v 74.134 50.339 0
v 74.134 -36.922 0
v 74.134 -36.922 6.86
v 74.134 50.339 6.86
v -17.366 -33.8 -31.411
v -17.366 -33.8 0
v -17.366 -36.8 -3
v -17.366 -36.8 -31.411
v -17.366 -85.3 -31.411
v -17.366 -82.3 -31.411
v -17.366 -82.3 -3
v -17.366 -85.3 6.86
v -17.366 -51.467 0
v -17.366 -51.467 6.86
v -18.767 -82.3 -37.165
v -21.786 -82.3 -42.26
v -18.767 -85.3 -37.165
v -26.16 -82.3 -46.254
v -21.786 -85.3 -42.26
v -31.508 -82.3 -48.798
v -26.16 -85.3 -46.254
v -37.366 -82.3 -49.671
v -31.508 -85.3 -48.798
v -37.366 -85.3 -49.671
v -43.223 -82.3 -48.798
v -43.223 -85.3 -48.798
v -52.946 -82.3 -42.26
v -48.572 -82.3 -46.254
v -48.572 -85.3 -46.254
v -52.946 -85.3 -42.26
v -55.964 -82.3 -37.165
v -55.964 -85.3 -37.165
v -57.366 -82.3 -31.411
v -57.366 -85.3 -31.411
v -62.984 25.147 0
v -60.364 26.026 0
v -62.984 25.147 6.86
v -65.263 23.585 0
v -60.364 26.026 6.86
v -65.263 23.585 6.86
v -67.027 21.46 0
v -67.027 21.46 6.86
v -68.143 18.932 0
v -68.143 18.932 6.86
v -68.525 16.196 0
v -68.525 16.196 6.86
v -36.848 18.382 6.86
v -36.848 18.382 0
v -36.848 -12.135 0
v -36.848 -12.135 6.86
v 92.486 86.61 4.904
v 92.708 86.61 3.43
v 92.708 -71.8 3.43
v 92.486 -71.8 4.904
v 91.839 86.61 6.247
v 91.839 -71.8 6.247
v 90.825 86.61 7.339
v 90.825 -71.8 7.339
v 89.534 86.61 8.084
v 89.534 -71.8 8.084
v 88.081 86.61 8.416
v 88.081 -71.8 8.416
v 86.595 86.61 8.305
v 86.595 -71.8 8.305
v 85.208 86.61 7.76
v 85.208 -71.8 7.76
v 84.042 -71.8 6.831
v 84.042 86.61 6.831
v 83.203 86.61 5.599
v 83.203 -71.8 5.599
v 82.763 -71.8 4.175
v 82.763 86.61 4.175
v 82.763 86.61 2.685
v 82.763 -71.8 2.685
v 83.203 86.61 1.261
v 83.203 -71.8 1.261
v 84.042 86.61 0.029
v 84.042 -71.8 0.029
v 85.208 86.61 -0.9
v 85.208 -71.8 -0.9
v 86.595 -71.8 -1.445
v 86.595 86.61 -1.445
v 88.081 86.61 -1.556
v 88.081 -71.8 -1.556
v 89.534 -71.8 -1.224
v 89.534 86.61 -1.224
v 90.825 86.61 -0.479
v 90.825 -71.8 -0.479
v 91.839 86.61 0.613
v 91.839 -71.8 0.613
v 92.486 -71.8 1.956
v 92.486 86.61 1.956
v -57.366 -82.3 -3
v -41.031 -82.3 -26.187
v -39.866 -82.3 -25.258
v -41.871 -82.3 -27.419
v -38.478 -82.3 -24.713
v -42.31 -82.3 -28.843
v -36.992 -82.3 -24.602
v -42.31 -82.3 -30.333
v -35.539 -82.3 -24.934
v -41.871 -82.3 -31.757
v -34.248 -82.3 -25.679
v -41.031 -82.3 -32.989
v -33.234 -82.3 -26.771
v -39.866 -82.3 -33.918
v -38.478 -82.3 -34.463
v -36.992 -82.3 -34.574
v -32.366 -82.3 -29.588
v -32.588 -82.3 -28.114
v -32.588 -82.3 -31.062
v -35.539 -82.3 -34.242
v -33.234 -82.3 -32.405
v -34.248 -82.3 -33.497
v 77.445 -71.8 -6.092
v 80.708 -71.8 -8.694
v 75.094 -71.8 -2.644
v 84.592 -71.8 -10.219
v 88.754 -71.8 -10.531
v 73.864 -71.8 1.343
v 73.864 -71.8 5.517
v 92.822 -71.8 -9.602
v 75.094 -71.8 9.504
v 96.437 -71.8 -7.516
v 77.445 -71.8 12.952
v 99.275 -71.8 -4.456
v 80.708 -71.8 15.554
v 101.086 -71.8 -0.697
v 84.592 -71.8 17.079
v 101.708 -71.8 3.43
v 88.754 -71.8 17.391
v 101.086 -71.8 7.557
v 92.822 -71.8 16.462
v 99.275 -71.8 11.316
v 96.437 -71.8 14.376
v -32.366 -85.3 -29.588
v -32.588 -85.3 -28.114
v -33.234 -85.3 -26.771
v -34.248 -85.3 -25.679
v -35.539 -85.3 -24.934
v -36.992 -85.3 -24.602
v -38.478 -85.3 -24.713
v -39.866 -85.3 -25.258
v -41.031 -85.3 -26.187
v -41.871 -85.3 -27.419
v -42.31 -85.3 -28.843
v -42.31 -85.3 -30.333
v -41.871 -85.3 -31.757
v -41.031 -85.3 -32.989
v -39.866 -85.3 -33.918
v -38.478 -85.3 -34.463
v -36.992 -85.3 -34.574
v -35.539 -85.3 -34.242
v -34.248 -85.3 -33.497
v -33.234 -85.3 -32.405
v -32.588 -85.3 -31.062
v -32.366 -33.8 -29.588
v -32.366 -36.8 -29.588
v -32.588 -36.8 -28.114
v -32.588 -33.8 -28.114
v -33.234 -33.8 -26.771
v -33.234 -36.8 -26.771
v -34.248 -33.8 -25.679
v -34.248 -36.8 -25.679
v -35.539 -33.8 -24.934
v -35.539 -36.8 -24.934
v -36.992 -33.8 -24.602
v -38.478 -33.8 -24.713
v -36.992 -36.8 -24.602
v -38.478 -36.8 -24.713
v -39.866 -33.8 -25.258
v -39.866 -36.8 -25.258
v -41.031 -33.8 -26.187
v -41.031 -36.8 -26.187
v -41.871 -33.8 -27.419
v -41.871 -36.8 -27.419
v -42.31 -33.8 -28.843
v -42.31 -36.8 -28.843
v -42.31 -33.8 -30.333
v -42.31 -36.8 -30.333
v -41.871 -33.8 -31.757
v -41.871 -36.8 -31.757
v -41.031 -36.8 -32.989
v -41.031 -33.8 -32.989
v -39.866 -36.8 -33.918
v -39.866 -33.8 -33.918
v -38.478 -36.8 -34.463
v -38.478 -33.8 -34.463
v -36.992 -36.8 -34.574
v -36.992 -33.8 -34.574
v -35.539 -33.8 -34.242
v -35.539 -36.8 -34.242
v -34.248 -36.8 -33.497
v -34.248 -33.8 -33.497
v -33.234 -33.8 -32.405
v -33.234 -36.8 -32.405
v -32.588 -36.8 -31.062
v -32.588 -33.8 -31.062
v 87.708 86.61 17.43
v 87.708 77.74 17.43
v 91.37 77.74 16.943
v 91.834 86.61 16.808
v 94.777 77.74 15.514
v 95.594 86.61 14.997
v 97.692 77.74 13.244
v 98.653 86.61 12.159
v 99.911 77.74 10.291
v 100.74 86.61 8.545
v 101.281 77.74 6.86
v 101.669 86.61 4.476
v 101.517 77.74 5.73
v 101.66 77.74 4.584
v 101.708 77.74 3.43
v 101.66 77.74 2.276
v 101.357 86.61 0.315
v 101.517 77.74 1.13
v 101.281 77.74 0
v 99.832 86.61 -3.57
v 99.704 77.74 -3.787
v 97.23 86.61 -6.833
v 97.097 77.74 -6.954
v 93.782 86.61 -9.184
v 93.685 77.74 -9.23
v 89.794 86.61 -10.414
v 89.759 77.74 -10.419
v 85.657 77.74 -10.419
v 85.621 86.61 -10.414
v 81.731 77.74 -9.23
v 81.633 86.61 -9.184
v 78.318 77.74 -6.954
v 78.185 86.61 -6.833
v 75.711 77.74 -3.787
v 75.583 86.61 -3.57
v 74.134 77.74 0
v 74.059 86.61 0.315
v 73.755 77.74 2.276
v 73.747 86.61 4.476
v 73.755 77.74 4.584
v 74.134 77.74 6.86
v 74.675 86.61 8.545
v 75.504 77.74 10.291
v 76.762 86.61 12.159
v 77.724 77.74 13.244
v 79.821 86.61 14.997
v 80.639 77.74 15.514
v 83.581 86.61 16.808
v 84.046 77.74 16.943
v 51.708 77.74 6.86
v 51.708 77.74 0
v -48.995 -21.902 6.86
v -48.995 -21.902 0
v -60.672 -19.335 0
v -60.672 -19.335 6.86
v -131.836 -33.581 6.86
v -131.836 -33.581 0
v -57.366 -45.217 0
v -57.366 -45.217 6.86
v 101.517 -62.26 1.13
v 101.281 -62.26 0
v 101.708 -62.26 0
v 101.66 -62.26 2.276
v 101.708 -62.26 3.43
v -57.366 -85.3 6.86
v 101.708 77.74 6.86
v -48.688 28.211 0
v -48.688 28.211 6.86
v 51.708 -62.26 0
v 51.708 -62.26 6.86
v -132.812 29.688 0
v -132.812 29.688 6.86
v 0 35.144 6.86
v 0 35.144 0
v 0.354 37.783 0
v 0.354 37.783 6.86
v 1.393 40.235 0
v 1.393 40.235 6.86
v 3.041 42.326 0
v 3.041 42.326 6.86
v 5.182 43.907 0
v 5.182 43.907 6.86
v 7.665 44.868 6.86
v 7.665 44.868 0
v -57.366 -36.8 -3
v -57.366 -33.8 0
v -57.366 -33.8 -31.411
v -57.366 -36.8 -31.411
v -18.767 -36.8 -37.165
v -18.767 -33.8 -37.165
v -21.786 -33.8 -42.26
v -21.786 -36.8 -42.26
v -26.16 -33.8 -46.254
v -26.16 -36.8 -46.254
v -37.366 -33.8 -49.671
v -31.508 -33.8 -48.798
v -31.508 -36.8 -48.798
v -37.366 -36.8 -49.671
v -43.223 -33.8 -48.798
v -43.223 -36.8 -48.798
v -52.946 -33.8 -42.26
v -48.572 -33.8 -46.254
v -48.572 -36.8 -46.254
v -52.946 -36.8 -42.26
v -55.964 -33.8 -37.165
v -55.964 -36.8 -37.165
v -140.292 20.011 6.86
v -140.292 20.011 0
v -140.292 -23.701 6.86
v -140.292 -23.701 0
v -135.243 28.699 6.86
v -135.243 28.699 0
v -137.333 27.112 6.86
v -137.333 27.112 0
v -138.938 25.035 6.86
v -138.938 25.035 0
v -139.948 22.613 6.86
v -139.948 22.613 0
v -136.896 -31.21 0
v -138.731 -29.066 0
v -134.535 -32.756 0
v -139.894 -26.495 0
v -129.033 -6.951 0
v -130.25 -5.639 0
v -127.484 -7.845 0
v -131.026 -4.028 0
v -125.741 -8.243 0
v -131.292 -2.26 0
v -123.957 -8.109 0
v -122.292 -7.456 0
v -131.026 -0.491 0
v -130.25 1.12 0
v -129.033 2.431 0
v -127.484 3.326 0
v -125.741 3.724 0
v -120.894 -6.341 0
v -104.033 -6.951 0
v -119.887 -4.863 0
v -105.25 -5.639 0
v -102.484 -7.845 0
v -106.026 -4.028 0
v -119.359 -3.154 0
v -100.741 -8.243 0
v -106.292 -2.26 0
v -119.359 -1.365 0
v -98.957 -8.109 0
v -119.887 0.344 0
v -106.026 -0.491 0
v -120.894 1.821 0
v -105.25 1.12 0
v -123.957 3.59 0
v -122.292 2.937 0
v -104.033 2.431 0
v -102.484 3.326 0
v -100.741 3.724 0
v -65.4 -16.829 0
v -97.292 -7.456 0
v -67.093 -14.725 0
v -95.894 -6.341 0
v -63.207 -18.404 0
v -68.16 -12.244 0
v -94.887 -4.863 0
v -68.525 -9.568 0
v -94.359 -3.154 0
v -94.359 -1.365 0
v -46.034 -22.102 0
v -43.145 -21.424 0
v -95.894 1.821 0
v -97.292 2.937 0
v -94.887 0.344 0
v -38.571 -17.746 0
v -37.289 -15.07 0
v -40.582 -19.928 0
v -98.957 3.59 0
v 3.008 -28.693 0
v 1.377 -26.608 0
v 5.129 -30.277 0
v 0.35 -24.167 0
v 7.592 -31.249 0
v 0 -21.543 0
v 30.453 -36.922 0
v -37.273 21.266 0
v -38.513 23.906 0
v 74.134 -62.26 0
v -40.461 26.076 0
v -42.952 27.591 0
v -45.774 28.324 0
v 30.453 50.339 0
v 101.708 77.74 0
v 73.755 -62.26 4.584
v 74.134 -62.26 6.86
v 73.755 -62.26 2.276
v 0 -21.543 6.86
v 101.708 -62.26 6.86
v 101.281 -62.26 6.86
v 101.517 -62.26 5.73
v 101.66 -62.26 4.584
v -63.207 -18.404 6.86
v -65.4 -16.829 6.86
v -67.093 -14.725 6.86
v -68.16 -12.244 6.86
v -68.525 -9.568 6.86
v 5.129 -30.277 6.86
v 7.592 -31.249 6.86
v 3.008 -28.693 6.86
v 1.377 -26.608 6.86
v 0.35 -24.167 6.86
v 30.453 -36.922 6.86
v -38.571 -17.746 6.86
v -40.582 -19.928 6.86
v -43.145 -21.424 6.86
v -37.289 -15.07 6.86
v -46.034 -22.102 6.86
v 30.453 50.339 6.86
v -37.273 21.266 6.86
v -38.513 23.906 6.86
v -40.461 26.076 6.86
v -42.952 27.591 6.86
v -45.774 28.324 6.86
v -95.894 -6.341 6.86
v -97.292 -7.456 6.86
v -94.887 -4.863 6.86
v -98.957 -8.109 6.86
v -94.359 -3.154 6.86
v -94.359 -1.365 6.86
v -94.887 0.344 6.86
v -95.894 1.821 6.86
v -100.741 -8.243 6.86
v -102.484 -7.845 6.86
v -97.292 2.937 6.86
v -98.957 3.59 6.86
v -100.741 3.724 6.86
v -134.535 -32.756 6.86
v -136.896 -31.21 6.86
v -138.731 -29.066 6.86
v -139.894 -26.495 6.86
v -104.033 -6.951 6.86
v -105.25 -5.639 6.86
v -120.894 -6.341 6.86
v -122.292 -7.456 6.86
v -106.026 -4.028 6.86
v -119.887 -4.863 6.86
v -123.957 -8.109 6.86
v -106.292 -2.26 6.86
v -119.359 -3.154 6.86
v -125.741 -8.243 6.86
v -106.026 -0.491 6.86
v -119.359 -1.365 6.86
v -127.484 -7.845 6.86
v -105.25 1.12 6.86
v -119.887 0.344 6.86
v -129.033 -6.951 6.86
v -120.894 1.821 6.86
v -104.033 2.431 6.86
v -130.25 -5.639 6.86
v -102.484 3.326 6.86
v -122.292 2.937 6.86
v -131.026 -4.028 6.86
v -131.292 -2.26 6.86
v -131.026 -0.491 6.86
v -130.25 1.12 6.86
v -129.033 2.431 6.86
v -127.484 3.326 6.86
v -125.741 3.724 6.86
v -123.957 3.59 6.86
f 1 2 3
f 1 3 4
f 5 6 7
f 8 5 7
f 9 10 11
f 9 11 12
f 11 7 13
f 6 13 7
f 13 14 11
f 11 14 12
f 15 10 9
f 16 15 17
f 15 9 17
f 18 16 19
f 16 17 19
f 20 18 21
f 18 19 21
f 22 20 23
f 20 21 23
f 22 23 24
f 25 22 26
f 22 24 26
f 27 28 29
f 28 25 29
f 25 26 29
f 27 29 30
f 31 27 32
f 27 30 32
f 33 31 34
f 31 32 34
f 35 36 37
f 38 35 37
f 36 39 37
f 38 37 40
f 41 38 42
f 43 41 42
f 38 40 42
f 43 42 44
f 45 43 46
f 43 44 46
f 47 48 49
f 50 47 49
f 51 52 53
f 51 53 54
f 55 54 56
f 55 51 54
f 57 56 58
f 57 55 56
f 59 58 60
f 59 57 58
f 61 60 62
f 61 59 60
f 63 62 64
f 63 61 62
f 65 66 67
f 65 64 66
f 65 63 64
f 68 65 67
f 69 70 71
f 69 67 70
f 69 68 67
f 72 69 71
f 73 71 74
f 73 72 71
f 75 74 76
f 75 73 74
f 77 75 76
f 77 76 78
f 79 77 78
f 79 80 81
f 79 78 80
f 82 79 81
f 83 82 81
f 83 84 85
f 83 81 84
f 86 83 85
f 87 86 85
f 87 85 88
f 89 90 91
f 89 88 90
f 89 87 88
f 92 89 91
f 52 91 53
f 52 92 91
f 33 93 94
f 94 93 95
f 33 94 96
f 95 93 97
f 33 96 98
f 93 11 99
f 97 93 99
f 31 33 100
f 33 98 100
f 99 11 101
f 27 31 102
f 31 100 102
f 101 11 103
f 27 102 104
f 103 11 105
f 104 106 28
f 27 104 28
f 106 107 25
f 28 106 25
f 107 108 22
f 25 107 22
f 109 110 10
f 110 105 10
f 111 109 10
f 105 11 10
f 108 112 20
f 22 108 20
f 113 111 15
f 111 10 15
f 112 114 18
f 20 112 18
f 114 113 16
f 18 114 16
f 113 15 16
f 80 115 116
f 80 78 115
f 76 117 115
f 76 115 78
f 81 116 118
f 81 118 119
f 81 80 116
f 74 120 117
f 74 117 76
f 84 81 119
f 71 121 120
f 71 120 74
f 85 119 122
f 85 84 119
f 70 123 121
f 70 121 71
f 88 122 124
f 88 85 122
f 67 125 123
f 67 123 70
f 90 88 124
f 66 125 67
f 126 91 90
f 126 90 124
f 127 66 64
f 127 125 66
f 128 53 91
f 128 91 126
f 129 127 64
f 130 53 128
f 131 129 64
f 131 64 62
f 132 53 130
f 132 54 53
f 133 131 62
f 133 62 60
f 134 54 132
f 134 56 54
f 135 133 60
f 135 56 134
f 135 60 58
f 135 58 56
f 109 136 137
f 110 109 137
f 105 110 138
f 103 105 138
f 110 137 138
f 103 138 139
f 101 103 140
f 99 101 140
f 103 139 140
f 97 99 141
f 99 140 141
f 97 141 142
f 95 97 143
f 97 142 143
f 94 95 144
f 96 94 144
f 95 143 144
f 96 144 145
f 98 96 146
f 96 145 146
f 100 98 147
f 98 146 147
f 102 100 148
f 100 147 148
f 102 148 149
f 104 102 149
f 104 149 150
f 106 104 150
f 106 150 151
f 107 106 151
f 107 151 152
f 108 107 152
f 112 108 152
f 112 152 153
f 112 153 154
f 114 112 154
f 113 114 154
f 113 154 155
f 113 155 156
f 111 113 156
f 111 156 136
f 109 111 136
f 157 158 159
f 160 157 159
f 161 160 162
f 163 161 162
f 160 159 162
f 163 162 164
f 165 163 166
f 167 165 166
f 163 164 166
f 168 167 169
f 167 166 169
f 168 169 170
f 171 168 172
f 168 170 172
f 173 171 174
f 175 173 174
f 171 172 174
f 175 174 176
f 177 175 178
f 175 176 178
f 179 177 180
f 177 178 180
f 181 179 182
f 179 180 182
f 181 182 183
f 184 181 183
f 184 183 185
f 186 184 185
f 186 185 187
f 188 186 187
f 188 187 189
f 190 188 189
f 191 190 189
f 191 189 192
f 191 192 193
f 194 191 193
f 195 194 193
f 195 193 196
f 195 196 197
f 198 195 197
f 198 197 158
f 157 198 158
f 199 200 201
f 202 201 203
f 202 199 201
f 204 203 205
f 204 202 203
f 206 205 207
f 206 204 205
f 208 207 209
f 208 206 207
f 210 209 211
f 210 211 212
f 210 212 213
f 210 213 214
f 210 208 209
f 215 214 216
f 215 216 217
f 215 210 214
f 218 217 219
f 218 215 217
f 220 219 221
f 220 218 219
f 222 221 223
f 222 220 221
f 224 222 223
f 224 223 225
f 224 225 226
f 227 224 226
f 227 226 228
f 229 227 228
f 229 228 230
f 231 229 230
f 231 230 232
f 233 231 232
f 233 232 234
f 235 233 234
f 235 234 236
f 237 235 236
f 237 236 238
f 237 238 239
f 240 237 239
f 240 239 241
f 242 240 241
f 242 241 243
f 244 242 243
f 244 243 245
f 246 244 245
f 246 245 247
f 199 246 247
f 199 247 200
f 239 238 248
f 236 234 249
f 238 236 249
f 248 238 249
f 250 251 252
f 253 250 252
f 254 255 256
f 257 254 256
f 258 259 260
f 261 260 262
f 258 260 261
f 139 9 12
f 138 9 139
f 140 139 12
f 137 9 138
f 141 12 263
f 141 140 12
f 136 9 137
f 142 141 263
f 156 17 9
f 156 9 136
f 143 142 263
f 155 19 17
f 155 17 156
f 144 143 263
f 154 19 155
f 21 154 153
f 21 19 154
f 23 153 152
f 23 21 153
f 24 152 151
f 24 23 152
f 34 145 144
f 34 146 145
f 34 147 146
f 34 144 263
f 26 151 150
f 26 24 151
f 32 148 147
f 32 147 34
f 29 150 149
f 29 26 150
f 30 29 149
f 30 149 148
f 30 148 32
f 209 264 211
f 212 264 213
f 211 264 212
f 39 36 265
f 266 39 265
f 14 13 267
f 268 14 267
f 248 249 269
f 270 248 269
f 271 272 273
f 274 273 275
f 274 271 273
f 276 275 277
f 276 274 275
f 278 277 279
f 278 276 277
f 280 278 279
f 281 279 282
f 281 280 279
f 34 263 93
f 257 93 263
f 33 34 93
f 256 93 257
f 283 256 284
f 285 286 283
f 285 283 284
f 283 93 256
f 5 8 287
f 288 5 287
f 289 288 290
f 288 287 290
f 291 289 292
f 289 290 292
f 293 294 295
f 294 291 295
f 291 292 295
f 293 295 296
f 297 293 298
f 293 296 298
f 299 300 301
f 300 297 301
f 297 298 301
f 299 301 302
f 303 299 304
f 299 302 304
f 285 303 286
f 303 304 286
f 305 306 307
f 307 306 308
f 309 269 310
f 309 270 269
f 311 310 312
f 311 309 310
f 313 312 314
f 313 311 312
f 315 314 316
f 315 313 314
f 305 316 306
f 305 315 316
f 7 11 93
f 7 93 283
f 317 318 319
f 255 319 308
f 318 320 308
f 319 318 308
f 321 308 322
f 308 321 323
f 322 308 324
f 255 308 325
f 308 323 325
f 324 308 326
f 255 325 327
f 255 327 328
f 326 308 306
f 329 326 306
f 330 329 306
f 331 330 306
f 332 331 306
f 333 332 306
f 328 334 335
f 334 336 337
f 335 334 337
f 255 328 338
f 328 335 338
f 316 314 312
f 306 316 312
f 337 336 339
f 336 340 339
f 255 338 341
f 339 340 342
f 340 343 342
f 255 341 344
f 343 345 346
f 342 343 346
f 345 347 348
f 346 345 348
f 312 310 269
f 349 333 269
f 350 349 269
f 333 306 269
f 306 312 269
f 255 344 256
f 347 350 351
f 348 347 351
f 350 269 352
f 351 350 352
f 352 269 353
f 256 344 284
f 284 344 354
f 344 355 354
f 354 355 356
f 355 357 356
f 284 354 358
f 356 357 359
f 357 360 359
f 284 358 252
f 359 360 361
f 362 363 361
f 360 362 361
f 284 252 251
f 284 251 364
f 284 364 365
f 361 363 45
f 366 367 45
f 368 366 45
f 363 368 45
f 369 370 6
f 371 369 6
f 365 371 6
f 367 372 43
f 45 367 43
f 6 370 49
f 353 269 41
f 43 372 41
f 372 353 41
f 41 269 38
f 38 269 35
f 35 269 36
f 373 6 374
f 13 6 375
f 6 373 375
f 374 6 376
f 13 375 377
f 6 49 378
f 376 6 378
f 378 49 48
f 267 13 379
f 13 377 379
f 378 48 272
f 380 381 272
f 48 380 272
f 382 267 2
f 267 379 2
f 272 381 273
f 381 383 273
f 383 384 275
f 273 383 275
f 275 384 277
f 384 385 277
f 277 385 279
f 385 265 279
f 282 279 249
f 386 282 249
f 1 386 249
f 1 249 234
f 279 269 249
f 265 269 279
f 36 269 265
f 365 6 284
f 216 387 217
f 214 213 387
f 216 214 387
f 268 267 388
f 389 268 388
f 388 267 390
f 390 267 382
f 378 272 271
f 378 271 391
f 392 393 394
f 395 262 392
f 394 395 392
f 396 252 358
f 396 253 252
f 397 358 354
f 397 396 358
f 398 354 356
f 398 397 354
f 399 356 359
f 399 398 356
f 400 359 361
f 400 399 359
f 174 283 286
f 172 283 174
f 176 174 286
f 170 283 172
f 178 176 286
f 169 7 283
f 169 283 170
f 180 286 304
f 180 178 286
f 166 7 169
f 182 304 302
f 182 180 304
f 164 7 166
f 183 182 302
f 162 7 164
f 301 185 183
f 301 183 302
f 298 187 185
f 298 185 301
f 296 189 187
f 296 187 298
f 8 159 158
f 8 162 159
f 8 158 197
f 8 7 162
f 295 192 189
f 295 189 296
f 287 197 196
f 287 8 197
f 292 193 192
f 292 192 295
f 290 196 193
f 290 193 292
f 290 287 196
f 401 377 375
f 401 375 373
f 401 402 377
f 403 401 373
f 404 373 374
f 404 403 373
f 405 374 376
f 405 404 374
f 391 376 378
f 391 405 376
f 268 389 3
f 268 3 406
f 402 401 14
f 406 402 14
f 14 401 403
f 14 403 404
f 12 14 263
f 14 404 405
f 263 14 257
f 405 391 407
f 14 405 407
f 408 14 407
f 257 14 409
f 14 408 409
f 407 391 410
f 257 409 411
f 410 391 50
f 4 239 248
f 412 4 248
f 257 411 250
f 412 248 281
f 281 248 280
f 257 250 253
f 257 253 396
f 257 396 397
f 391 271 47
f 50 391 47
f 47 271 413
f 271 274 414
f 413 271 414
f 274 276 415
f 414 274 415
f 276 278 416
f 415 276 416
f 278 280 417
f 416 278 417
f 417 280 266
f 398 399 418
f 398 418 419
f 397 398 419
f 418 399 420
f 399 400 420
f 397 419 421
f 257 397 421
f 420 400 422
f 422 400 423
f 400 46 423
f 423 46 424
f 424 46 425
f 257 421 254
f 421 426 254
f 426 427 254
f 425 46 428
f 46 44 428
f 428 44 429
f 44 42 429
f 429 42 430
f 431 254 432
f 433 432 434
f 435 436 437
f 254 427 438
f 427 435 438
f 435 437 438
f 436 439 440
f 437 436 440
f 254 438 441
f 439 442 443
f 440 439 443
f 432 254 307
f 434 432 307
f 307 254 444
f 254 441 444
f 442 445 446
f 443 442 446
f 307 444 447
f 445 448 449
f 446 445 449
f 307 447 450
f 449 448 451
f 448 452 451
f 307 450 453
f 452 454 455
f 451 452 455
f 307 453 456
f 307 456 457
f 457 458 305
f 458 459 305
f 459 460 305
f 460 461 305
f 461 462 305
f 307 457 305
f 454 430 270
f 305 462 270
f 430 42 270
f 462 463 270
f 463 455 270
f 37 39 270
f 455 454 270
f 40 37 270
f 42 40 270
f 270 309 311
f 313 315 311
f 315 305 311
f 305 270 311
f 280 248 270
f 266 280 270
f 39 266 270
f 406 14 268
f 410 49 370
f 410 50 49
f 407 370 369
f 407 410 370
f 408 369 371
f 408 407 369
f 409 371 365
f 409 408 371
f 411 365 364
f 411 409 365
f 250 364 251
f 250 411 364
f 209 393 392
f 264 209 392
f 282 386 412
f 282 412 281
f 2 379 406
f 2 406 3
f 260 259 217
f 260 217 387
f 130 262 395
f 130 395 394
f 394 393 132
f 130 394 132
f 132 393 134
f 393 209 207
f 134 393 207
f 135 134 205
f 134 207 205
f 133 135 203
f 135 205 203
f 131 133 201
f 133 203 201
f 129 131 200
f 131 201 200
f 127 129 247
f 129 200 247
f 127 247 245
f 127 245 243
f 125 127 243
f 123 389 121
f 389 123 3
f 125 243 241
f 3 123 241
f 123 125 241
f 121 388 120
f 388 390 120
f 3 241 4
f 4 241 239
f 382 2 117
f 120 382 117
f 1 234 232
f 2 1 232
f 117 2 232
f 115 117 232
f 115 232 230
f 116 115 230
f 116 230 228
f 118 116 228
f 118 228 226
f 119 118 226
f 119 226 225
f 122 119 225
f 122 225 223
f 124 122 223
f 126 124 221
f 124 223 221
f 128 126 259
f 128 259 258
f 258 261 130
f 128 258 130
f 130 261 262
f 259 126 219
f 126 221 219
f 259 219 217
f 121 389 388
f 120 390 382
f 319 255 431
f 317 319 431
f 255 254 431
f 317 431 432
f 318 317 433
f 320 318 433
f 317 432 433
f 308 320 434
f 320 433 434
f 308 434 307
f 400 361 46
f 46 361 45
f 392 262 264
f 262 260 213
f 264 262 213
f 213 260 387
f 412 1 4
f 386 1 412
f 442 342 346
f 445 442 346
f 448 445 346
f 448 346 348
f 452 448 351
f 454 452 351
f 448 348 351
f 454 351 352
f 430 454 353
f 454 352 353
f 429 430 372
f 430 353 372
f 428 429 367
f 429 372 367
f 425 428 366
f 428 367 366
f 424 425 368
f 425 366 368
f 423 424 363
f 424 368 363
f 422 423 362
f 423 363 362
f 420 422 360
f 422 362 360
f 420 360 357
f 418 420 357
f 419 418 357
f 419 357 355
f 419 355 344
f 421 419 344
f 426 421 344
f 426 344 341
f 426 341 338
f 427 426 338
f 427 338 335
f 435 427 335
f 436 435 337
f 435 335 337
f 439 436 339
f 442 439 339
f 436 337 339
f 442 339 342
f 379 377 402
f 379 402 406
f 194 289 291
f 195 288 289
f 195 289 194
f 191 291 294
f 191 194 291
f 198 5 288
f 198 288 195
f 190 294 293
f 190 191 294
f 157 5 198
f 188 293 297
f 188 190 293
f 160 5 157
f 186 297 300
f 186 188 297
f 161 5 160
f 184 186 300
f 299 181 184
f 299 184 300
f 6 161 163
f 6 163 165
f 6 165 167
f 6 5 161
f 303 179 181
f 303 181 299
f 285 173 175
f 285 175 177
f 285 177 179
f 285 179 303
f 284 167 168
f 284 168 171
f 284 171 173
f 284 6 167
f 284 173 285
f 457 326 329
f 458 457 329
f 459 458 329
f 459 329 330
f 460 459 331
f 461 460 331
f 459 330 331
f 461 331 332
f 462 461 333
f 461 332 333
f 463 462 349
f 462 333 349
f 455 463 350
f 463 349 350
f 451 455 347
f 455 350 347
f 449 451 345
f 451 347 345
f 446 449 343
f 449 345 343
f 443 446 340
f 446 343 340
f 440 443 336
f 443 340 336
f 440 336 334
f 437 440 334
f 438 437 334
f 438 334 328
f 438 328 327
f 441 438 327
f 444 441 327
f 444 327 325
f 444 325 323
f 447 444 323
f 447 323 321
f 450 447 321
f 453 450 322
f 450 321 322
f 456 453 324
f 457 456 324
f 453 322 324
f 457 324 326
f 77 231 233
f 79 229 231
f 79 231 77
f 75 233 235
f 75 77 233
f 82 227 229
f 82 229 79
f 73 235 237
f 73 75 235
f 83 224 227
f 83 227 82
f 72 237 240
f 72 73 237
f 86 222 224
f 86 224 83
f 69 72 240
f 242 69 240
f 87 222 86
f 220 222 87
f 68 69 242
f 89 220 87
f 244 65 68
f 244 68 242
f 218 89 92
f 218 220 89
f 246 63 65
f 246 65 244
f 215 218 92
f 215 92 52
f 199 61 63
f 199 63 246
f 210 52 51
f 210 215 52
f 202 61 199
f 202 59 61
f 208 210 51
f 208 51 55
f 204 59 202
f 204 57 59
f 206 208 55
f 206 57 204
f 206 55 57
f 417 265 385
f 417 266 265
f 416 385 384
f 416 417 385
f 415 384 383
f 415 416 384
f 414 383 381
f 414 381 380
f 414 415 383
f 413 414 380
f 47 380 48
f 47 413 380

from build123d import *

# Parameters (mm, degrees)
EXTRUDE_1_DEPTH          = 6.86
SKETCH_3_R               = 14
EXTRUDE_2_DEPTH          = 140
SKETCH_4_R               = 14
EXTRUDE_3_DEPTH          = 9.54
EXTRUDE_START            = 8.87
SKETCH_5_R               = 14
EXTRUDE_4_DEPTH          = 8.87
SKETCH_6_W               = 40
SKETCH_6_H               = 51.5
EXTRUDE_5_DEPTH          = 50
CUT_EXTRUDE_1_DEPTH      = 70
SKETCH_8_W               = 58.379913489
SKETCH_8_H               = 45.5
CUT_EXTRUDE_2_DEPTH      = 50
SKETCH_9_R               = 5
CUT_EXTRUDE_3_DEPTH      = 60
EXTRUDE_6_DEPTH          = 6.86
SKETCH_11_R              = 6
CUT_EXTRUDE_4_DEPTH      = 6.86
CUT_EXTRUDE_5_DEPTH      = 218.354242016
CUT_EXTRUDE_5_DEPTH_BACK = 218.354242016
SKETCH_12_R              = 5
CUT_EXTRUDE_6_DEPTH      = 6.86
CUT_EXTRUDE_7_DEPTH      = 6.86
FILLET_1_R               = 10
FILLET_2_R               = 10


with BuildPart() as part:
    # 스케치1 → 보스-돌출1 (new body)
    with BuildSketch(Plane.XY):
        Polygon((-140.292347602, 27.740456746), (-140.292347602, -32.259543254), (51.707652398, -62.259543254), (101.707652398, -62.259543254), (101.707652398, 77.740456746), (51.707652398, 77.740456746), align=None)
    extrude(amount=EXTRUDE_1_DEPTH)

    # 스케치3 → 보스-돌출2 (add)
    with BuildSketch(Plane(origin=(0, 77.740456746, 0), x_dir=(1, 0, 0), z_dir=(0, 1, 0))):
        with Locations((87.707652398, -3.43)):
            Circle(SKETCH_3_R)
    extrude(amount=-EXTRUDE_2_DEPTH)

    # 스케치4 → 보스-돌출3 (add)
    with BuildSketch(Plane.XZ.offset(62.259543254)):
        with Locations((87.707652398, 3.43)):
            Circle(SKETCH_4_R)
    extrude(amount=EXTRUDE_3_DEPTH)

    # 스케치5 → 보스-돌출4 (add)
    with BuildSketch(Plane(origin=(0, 77.740456746, 0), x_dir=(1, 0, 0), z_dir=(0, 1, 0)).offset(EXTRUDE_START)):
        with Locations(Location((87.707652398, -3.43, 0), (0, 0, 270))):
            Circle(SKETCH_5_R)
    extrude(amount=-EXTRUDE_4_DEPTH)

    # 스케치6 → 보스-돌출5 (add)
    with BuildSketch(Plane(origin=(0, 0, 0), x_dir=(-1, 0, 0), z_dir=(0, 0, -1))):
        with Locations((37.365670703, -59.549543254)):
            Rectangle(SKETCH_6_W, SKETCH_6_H)
    extrude(amount=EXTRUDE_5_DEPTH)

    # 스케치7 → 컷-돌출1 (cut)
    with BuildSketch(Plane.XZ.offset(85.299543254)):
        with BuildLine():
            Line((-57.365670703, -31.410504054), (-57.365670703, -50))
            Line((-57.365670703, -50), (-17.365670703, -50))
            Line((-17.365670703, -50), (-17.365670703, -31.410504054))
            ThreePointArc((-17.365670703, -31.410504054), (-37.365670703, -49.67087302), (-57.365670703, -31.410504054))
        make_face()
    extrude(amount=-CUT_EXTRUDE_1_DEPTH, mode=Mode.SUBTRACT)

    # 스케치8 → 컷-돌출2 (cut)
    with BuildSketch(Plane(origin=(-17.365670703, 0, 0), x_dir=(0, 0, -1), z_dir=(1, 0, 0))):
        with Locations((32.189956745, -59.549543254)):
            Rectangle(SKETCH_8_W, SKETCH_8_H)
    extrude(amount=-CUT_EXTRUDE_2_DEPTH, mode=Mode.SUBTRACT)

    # 스케치9 → 컷-돌출3 (cut)
    with BuildSketch(Plane.XZ.offset(85.299543254)):
        with Locations((-37.365670703, -29.58800733)):
            Circle(SKETCH_9_R)
    extrude(amount=-CUT_EXTRUDE_3_DEPTH, mode=Mode.SUBTRACT)

    # 스케치10 → 보스-돌출6 (add)
    with BuildSketch(Plane.XY):
        Polygon((-17.365670703, -51.466836519), (-17.365670703, -85.299543254), (-57.365670703, -85.299543254), (-57.365670703, -45.216836519), align=None)
    extrude(amount=EXTRUDE_6_DEPTH)

    # 스케치11 → 컷-돌출4 (cut)
    with BuildSketch(Plane(origin=(0, 0, 0), x_dir=(-1, 0, 0), z_dir=(0, 0, -1))):
        with Locations((100.292347602, -2.259543254)):
            Circle(SKETCH_11_R)
        with Locations((125.292347602, -2.259543254)):
            Circle(SKETCH_11_R)
    extrude(amount=-CUT_EXTRUDE_4_DEPTH, mode=Mode.SUBTRACT)

    # 스케치12 → 컷-돌출5 (cut, two sides: drawn at the far end of the back side and taken through both)
    with BuildSketch(Plane.XZ.offset(71.799543254).offset(-CUT_EXTRUDE_5_DEPTH_BACK)):
        with Locations((87.707652398, 3.43)):
            Circle(SKETCH_12_R)
    extrude(amount=CUT_EXTRUDE_5_DEPTH + CUT_EXTRUDE_5_DEPTH_BACK, mode=Mode.SUBTRACT)

    # 스케치13 → 컷-돌출6 (cut)
    with BuildSketch(Plane(origin=(0, 0, 0), x_dir=(-1, 0, 0), z_dir=(0, 0, -1))):
        Polygon((-74.134329297, 50.339076342), (-30.453327594, 50.339076342), (0, 43.027707352), (0, -29.365200476), (-30.453327594, -36.922211026), (-74.134329297, -36.922211026), align=None)
    extrude(amount=-CUT_EXTRUDE_6_DEPTH, mode=Mode.SUBTRACT)

    # 스케치14 → 컷-돌출7 (cut)
    with BuildSketch(Plane(origin=(0, 0, 0), x_dir=(-1, 0, 0), z_dir=(0, 0, -1))):
        Polygon((68.524633072, 24.49831751), (36.848219376, 30.426812619), (36.848219376, -24.572302869), (68.524633072, -17.60850751), align=None)
    extrude(amount=-CUT_EXTRUDE_7_DEPTH, mode=Mode.SUBTRACT)

    # 필렛1
    fillet_1_edges = [part.edges().sort_by_distance(p)[0] for p in [
        (0, 43.027707352, 3.43),
        (0, -29.365200476, 3.43),
        (-68.524633072, 24.49831751, 3.43),
        (-68.524633072, -17.60850751, 3.43),
        (-36.848219376, -24.572302869, 3.43),
        (-36.848219376, 30.426812619, 3.43),
    ]]
    fillet(fillet_1_edges, radius=FILLET_1_R)

    # 필렛2
    fillet_2_edges = [part.edges().sort_by_distance(p)[0] for p in [
        (-140.292347602, -32.259543254, 3.43),
        (-140.292347602, 27.740456746, 3.43),
    ]]
    fillet(fillet_2_edges, radius=FILLET_2_R)


solid = part.part
